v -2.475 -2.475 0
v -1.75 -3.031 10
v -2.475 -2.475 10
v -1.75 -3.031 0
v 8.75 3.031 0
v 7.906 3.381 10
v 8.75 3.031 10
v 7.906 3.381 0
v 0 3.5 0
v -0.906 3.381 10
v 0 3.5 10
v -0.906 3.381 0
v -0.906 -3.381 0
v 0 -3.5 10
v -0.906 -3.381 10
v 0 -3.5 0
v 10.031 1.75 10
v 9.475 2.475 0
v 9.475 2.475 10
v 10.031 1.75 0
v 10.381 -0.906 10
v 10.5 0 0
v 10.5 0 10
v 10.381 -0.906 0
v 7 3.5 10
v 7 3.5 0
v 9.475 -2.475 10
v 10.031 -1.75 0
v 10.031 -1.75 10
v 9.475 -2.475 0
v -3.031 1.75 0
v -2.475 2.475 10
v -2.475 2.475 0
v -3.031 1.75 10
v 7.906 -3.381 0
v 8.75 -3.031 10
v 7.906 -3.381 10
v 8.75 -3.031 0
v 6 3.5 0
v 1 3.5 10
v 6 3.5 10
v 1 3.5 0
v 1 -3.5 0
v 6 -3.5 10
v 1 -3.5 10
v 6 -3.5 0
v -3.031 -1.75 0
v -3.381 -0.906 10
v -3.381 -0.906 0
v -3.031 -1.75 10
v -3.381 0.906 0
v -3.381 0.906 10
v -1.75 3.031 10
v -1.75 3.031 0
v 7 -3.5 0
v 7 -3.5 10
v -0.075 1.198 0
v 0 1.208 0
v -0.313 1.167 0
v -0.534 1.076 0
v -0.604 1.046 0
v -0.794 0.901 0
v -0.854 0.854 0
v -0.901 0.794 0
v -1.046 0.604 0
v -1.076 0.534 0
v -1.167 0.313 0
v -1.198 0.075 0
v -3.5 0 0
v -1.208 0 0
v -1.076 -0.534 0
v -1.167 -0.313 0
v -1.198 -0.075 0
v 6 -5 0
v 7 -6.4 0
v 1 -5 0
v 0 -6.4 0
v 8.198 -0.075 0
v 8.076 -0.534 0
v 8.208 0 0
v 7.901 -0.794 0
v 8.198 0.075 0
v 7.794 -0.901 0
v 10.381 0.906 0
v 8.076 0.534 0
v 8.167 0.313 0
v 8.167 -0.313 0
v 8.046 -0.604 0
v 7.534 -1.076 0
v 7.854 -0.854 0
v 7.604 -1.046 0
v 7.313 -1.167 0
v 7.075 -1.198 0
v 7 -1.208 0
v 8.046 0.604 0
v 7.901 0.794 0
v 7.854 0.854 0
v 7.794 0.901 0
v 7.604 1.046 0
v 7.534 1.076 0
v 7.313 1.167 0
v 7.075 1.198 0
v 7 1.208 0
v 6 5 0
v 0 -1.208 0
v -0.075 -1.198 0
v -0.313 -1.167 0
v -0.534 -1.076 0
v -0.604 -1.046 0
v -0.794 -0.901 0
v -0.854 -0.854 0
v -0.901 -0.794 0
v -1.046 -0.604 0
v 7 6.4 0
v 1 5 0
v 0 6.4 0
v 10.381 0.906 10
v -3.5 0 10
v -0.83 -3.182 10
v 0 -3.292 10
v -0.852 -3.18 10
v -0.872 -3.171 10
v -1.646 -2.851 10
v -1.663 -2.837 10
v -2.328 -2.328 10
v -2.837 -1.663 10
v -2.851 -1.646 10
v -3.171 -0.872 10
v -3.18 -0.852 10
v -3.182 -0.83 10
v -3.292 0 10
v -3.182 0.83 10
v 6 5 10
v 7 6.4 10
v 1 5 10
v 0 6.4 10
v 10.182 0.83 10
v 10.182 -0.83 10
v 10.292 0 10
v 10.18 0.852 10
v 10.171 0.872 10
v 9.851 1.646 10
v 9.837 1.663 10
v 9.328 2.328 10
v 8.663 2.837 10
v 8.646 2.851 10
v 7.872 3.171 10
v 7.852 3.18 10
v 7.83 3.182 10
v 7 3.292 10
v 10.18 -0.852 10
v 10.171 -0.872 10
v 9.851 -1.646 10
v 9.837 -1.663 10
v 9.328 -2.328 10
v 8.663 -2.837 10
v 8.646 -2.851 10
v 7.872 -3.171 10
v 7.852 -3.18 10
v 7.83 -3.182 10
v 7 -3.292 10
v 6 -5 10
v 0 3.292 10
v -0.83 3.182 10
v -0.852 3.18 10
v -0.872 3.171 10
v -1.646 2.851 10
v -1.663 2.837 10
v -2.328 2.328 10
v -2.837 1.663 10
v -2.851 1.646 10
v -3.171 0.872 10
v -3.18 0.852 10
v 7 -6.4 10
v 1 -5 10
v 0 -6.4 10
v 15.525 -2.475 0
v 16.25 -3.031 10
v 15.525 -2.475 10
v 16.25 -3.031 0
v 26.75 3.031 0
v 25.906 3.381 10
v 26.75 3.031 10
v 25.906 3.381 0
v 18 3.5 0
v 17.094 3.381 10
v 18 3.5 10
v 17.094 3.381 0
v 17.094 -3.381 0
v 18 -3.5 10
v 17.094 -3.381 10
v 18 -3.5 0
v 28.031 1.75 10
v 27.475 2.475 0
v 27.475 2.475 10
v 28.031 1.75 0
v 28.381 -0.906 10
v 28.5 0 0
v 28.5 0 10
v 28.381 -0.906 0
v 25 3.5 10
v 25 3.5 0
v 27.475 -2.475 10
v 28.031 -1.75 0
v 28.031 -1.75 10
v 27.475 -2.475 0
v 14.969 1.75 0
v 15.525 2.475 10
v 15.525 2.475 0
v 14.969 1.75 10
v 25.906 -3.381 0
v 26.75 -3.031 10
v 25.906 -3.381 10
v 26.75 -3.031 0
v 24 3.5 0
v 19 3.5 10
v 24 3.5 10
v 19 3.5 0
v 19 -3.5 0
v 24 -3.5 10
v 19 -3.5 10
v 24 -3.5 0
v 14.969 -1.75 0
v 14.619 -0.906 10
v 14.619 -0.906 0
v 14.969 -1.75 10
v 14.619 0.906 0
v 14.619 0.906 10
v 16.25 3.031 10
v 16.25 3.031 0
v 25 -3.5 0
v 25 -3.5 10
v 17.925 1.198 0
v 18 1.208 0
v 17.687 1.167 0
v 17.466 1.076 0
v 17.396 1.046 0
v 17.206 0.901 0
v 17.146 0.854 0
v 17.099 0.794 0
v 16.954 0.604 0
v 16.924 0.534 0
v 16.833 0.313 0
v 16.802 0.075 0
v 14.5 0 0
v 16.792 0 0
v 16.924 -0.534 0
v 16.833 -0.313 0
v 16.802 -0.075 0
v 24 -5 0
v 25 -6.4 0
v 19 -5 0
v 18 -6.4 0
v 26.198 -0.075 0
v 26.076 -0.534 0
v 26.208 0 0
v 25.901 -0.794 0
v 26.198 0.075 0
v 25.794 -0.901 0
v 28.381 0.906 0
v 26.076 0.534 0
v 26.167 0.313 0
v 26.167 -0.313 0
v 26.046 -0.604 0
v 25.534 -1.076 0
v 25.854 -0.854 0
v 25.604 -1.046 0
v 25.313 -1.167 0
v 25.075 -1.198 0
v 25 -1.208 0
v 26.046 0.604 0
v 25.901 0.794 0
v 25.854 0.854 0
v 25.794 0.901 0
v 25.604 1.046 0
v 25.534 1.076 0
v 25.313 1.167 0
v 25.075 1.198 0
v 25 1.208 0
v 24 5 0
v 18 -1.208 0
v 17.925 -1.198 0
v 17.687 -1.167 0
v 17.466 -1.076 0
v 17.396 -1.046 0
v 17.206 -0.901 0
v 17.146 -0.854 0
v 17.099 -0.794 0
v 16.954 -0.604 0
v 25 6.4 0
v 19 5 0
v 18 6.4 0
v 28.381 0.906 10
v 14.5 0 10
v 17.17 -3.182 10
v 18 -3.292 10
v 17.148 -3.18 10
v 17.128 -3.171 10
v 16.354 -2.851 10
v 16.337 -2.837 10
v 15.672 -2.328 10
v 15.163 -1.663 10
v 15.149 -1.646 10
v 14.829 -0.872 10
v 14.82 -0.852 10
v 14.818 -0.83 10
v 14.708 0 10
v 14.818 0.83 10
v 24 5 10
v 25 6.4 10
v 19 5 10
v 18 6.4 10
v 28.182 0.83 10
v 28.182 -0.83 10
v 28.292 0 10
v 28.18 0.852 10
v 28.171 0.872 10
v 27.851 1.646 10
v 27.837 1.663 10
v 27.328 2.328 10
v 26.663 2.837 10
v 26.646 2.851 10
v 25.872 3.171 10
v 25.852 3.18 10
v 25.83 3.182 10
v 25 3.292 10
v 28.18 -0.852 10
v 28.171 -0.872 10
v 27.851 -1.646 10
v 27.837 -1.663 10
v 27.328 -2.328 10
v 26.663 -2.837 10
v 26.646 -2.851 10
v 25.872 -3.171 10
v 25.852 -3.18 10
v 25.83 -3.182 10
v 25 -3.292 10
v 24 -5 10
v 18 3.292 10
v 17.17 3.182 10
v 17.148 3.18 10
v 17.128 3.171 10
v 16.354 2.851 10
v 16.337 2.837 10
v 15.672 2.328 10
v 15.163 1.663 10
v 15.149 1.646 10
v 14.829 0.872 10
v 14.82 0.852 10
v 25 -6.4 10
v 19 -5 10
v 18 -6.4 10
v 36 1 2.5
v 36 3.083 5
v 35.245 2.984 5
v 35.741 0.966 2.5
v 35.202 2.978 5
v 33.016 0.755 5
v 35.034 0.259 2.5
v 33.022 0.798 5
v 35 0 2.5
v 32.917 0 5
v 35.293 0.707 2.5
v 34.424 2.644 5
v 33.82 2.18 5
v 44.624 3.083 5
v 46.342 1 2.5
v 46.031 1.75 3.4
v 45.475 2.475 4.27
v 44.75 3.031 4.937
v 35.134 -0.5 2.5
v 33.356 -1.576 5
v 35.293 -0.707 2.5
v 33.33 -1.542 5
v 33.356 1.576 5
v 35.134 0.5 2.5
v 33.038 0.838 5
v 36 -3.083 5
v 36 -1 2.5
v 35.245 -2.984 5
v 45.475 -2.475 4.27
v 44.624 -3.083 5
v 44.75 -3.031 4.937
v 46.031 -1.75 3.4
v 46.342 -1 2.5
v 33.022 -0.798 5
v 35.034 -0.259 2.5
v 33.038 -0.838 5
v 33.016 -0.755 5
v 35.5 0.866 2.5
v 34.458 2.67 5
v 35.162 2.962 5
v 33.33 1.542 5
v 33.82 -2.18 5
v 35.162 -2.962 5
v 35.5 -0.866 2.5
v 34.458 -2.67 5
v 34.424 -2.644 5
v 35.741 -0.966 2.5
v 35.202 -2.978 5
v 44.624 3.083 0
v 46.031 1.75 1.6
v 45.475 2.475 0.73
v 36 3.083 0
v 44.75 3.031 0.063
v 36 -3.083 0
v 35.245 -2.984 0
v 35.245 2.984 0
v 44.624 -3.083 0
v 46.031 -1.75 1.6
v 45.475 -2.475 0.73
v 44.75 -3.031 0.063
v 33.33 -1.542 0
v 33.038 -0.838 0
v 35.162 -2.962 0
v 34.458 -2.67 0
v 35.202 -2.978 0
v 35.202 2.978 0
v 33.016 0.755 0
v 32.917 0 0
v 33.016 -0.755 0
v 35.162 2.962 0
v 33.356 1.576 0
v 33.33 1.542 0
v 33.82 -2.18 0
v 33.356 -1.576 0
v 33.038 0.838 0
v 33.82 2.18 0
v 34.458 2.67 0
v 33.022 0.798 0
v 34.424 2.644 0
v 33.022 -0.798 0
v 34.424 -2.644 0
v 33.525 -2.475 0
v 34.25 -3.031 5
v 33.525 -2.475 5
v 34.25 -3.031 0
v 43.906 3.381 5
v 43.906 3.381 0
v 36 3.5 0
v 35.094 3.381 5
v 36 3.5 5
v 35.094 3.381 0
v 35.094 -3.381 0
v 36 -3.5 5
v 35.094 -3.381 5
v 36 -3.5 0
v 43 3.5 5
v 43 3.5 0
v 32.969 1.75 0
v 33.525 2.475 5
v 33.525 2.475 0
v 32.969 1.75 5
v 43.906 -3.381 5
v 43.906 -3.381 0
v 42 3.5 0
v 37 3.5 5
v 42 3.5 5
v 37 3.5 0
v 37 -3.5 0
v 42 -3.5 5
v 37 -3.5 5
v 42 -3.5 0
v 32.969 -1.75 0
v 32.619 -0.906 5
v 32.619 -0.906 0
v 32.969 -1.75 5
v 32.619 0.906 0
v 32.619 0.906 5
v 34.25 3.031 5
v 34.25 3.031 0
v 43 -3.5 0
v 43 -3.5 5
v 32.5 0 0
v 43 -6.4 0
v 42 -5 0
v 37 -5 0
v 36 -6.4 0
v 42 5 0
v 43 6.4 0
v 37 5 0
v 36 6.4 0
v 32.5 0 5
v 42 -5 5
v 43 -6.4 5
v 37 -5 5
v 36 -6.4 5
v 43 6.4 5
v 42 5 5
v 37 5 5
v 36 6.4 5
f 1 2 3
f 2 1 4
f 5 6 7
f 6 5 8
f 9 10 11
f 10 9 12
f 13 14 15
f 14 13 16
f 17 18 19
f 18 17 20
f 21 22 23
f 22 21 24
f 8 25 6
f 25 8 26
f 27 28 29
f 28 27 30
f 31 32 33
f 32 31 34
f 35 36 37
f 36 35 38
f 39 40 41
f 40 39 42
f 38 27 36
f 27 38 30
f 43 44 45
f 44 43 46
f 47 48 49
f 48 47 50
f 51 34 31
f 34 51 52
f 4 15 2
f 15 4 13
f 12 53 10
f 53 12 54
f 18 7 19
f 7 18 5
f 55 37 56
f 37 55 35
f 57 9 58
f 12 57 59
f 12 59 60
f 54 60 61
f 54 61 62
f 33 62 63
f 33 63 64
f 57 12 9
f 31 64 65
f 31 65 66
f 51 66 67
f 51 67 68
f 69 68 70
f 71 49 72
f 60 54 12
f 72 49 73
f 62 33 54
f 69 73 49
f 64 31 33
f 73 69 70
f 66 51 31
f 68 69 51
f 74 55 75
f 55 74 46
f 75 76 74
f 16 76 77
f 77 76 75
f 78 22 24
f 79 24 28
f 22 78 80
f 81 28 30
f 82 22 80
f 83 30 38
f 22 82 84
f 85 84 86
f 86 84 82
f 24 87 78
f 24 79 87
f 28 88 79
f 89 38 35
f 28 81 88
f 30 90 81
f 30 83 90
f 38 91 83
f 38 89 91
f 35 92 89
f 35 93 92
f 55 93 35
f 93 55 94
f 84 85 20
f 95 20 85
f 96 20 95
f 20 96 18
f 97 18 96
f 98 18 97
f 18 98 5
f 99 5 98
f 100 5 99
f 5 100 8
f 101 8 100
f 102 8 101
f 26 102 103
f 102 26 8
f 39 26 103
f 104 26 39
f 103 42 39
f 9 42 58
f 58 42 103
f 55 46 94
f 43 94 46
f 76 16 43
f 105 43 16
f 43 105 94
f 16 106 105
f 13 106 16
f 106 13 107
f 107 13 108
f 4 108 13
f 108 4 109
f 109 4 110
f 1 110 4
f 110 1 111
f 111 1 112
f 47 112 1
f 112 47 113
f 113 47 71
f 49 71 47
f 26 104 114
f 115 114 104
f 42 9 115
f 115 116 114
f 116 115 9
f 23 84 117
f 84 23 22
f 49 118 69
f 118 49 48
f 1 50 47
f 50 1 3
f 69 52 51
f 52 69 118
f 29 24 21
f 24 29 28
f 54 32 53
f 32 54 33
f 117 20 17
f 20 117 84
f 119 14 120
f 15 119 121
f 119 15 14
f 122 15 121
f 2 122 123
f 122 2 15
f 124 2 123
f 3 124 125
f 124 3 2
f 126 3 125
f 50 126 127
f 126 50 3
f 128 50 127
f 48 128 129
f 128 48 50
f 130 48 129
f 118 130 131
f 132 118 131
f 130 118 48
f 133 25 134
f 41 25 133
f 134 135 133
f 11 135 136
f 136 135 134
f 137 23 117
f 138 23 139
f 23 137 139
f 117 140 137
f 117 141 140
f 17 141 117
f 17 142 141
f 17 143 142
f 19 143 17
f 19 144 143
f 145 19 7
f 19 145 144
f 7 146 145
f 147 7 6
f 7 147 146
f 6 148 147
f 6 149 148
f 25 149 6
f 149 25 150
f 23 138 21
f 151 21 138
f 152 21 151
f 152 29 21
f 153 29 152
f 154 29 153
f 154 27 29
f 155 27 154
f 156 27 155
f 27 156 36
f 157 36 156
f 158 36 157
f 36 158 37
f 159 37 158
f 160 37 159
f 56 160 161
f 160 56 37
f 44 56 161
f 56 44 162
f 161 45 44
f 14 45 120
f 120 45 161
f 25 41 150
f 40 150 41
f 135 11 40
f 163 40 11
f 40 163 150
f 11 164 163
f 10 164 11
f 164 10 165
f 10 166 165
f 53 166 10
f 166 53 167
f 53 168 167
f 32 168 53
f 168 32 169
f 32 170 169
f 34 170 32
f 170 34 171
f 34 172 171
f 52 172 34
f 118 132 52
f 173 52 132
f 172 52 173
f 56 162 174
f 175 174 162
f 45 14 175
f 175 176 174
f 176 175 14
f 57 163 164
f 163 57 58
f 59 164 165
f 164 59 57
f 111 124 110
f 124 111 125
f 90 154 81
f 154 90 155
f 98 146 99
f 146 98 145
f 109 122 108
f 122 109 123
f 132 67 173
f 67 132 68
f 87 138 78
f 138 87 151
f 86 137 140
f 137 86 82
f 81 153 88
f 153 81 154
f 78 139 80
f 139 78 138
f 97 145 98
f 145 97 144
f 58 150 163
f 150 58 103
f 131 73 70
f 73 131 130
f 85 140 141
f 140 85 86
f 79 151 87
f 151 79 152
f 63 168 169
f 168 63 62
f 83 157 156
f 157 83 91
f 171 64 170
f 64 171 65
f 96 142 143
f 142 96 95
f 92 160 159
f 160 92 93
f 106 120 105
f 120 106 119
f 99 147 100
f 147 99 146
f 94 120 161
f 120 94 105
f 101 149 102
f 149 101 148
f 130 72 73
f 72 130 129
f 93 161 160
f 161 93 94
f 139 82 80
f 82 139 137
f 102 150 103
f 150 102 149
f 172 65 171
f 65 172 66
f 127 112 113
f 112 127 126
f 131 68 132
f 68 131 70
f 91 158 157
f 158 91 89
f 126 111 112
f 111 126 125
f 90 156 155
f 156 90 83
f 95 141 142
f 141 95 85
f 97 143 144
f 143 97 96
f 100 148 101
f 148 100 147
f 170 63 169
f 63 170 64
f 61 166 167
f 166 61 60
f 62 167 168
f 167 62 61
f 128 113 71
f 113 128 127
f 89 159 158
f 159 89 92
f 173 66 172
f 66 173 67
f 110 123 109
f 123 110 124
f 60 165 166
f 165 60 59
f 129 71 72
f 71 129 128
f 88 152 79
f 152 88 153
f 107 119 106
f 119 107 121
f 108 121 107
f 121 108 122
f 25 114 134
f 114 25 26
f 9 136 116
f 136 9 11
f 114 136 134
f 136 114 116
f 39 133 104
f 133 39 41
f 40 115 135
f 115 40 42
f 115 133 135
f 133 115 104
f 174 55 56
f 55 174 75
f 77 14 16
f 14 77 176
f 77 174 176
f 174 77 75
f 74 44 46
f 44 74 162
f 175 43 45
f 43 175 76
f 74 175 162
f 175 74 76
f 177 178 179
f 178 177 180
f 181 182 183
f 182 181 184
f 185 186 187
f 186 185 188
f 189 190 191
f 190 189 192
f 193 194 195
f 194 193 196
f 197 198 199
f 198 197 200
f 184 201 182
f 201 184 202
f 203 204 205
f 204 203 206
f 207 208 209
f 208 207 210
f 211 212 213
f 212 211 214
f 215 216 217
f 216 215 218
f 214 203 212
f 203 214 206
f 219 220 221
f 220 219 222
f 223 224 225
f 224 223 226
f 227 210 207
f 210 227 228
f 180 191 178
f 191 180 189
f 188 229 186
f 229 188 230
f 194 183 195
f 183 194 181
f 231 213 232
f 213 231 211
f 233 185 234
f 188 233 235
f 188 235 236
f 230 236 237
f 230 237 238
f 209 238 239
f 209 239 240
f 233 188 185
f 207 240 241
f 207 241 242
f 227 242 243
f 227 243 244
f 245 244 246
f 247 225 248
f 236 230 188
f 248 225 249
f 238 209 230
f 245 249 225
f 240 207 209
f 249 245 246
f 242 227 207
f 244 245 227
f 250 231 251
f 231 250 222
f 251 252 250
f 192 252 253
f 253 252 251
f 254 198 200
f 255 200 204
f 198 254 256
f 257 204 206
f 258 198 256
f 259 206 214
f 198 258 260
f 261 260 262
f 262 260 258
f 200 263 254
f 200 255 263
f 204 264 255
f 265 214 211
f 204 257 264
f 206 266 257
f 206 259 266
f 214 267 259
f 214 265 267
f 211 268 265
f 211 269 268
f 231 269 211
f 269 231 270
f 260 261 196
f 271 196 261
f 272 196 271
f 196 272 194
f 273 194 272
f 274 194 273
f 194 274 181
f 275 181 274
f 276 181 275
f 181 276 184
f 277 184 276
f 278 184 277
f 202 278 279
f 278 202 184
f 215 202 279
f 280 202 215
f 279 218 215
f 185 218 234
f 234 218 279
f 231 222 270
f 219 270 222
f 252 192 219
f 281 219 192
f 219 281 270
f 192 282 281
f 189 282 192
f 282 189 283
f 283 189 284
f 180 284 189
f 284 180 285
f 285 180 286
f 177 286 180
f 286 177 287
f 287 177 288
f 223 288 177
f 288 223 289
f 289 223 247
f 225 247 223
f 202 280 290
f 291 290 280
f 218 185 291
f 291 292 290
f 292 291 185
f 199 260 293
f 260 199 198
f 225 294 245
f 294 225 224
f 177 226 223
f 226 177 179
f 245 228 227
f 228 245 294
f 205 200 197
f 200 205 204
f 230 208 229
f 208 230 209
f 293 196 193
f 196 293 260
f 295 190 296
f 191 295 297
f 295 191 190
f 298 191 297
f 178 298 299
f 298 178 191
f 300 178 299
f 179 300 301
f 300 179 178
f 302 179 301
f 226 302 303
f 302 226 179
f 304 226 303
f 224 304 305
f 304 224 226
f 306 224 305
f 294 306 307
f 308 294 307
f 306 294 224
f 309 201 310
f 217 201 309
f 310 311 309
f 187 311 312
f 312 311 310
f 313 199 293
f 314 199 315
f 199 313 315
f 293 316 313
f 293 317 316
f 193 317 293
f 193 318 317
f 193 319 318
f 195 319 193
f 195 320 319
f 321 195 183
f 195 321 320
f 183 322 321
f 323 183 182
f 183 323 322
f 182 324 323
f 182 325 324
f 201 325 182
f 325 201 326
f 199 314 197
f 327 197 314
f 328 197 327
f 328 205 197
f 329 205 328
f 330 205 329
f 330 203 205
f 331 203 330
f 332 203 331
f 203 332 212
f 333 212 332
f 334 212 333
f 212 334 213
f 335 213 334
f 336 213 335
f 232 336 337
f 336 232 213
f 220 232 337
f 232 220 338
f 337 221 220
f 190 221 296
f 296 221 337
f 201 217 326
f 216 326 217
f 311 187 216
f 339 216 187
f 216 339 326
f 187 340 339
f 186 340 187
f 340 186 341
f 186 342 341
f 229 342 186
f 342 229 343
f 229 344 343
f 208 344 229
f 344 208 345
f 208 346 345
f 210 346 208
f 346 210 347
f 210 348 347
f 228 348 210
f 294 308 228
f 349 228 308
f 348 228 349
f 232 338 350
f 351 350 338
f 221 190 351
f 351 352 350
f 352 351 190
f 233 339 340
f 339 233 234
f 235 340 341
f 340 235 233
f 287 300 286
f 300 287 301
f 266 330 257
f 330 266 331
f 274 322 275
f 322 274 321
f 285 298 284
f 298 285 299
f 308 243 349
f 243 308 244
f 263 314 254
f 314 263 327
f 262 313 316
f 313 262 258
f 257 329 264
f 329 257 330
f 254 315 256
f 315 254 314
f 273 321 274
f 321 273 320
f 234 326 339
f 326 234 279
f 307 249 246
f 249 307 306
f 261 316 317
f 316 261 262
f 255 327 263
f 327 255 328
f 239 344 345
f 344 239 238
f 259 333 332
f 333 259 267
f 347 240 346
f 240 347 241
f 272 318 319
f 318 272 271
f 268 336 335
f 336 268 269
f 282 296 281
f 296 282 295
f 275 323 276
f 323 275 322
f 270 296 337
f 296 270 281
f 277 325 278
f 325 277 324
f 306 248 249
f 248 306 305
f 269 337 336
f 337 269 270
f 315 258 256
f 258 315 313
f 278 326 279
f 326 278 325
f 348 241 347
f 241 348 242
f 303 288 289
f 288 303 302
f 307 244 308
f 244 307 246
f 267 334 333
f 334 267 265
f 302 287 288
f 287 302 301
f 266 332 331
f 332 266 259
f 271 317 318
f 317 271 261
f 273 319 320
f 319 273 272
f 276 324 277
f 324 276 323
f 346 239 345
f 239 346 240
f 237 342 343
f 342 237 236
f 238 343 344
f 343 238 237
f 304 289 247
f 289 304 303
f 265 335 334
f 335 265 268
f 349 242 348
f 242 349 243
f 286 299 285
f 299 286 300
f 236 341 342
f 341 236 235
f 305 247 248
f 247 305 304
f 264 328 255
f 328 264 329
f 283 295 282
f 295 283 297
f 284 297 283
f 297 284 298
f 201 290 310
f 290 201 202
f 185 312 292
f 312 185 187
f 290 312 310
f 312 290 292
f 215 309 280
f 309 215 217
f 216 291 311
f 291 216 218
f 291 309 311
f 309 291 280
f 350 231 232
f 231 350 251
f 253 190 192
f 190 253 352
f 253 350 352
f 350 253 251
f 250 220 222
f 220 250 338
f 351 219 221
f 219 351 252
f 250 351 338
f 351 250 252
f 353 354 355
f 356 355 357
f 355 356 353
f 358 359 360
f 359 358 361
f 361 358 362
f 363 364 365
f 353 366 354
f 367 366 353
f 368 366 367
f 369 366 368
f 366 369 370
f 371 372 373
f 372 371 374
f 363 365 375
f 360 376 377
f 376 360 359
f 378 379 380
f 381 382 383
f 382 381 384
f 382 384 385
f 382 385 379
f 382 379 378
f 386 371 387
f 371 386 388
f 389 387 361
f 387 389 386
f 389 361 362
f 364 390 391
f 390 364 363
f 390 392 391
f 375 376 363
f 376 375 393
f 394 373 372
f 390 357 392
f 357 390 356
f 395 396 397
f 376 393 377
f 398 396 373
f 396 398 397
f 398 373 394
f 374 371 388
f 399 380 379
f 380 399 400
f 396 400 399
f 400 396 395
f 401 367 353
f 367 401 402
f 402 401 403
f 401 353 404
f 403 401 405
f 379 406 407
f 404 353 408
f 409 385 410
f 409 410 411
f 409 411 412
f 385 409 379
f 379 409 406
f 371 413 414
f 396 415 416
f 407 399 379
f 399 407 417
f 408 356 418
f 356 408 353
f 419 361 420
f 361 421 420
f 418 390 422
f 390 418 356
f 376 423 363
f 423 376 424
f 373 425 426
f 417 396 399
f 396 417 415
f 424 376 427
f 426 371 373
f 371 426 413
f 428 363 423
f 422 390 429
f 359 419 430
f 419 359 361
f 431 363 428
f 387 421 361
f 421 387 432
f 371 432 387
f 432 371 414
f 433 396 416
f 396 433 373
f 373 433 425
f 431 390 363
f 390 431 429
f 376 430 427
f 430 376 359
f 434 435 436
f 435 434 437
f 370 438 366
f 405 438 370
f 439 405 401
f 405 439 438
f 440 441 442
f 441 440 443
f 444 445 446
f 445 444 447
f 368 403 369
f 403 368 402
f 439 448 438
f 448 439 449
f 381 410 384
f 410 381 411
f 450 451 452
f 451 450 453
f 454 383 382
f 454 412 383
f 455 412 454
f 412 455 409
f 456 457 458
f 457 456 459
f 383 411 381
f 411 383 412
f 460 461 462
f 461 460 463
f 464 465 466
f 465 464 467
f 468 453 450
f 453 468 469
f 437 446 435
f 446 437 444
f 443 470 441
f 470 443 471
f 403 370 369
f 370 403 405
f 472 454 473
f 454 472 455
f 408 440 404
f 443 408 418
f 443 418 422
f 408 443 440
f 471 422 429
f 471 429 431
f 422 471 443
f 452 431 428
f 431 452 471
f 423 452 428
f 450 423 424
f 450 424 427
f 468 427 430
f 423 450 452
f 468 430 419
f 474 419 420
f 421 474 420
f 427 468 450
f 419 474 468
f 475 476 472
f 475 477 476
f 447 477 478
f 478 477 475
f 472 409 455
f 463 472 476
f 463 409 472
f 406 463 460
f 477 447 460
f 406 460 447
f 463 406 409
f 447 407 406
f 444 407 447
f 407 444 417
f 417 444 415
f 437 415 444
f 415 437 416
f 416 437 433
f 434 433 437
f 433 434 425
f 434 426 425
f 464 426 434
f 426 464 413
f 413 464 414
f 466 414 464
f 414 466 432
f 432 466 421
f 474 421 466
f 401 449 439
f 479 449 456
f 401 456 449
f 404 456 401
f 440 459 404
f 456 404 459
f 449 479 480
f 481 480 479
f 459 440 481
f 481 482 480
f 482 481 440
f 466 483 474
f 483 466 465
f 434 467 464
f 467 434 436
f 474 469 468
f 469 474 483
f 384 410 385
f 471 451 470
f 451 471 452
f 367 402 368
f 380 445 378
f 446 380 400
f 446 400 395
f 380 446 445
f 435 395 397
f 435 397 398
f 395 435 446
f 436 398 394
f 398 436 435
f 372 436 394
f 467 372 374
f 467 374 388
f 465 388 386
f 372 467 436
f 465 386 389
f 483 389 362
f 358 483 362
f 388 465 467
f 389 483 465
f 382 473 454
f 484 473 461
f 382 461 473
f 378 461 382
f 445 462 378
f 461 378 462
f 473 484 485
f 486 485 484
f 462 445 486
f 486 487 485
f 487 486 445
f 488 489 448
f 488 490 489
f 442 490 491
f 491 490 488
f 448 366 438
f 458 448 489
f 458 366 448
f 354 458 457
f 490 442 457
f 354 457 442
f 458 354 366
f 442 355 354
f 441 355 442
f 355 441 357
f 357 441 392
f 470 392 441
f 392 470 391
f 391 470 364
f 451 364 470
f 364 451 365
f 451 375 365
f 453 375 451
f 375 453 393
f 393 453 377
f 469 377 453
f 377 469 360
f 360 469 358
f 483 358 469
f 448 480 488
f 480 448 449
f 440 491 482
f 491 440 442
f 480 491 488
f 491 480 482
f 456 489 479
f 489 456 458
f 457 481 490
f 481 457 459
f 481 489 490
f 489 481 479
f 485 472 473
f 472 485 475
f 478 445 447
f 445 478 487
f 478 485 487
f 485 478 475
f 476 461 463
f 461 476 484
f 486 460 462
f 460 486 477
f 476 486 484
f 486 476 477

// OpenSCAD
$fn=24;
module extremo(){
difference(){
hull(){
cylinder(r=7/2,h=10);
translate([12-5,0,0])cylinder(r=7/2,h=10);
}
translate([0,0,-1])
hull(){
cylinder(r1=2/2,r2=7/2,h=12);
translate([12-5,0,0])cylinder(r1=2/2,r2=7/2,h=12);
}
}
difference(){
translate([0,3.4,0])cube([7,3,10]);
translate([1,3,-5])cube([5,2,20]);
}
mirror([0,1,0])
difference(){
translate([0,3.4,0])cube([7,3,10]);
translate([1,3,-5])cube([5,2,20]);
}
}

module medio(){
difference(){
hull(){
cylinder(r=7/2,h=5);
translate([12-5,0,0])cylinder(r=7/2,h=5);
}
translate([0,0,2.5]){
translate([0,0,0])
hull(){
cylinder(r1=2/2,r2=7/2,h=3);
translate([12-5+10,0,0])cylinder(r1=2/2,r2=7/2,h=3);
}
translate([0,0,-3])
hull(){
cylinder(r1=7/2,r2=2/2,h=3);
translate([12-5+10,0,0])cylinder(r1=7/2,r2=2/2,h=3);
}
}
}
difference(){
translate([0,3.4,0])cube([7,3,5]);
translate([1,3,-5])cube([5,2,20]);
}
mirror([0,1,0])
difference(){
translate([0,3.4,0])cube([7,3,5]);
translate([1,3,-5])cube([5,2,20]);
}
}

extremo();
translate([18,0,0])
extremo();
translate([18*2,0,0])
medio();
